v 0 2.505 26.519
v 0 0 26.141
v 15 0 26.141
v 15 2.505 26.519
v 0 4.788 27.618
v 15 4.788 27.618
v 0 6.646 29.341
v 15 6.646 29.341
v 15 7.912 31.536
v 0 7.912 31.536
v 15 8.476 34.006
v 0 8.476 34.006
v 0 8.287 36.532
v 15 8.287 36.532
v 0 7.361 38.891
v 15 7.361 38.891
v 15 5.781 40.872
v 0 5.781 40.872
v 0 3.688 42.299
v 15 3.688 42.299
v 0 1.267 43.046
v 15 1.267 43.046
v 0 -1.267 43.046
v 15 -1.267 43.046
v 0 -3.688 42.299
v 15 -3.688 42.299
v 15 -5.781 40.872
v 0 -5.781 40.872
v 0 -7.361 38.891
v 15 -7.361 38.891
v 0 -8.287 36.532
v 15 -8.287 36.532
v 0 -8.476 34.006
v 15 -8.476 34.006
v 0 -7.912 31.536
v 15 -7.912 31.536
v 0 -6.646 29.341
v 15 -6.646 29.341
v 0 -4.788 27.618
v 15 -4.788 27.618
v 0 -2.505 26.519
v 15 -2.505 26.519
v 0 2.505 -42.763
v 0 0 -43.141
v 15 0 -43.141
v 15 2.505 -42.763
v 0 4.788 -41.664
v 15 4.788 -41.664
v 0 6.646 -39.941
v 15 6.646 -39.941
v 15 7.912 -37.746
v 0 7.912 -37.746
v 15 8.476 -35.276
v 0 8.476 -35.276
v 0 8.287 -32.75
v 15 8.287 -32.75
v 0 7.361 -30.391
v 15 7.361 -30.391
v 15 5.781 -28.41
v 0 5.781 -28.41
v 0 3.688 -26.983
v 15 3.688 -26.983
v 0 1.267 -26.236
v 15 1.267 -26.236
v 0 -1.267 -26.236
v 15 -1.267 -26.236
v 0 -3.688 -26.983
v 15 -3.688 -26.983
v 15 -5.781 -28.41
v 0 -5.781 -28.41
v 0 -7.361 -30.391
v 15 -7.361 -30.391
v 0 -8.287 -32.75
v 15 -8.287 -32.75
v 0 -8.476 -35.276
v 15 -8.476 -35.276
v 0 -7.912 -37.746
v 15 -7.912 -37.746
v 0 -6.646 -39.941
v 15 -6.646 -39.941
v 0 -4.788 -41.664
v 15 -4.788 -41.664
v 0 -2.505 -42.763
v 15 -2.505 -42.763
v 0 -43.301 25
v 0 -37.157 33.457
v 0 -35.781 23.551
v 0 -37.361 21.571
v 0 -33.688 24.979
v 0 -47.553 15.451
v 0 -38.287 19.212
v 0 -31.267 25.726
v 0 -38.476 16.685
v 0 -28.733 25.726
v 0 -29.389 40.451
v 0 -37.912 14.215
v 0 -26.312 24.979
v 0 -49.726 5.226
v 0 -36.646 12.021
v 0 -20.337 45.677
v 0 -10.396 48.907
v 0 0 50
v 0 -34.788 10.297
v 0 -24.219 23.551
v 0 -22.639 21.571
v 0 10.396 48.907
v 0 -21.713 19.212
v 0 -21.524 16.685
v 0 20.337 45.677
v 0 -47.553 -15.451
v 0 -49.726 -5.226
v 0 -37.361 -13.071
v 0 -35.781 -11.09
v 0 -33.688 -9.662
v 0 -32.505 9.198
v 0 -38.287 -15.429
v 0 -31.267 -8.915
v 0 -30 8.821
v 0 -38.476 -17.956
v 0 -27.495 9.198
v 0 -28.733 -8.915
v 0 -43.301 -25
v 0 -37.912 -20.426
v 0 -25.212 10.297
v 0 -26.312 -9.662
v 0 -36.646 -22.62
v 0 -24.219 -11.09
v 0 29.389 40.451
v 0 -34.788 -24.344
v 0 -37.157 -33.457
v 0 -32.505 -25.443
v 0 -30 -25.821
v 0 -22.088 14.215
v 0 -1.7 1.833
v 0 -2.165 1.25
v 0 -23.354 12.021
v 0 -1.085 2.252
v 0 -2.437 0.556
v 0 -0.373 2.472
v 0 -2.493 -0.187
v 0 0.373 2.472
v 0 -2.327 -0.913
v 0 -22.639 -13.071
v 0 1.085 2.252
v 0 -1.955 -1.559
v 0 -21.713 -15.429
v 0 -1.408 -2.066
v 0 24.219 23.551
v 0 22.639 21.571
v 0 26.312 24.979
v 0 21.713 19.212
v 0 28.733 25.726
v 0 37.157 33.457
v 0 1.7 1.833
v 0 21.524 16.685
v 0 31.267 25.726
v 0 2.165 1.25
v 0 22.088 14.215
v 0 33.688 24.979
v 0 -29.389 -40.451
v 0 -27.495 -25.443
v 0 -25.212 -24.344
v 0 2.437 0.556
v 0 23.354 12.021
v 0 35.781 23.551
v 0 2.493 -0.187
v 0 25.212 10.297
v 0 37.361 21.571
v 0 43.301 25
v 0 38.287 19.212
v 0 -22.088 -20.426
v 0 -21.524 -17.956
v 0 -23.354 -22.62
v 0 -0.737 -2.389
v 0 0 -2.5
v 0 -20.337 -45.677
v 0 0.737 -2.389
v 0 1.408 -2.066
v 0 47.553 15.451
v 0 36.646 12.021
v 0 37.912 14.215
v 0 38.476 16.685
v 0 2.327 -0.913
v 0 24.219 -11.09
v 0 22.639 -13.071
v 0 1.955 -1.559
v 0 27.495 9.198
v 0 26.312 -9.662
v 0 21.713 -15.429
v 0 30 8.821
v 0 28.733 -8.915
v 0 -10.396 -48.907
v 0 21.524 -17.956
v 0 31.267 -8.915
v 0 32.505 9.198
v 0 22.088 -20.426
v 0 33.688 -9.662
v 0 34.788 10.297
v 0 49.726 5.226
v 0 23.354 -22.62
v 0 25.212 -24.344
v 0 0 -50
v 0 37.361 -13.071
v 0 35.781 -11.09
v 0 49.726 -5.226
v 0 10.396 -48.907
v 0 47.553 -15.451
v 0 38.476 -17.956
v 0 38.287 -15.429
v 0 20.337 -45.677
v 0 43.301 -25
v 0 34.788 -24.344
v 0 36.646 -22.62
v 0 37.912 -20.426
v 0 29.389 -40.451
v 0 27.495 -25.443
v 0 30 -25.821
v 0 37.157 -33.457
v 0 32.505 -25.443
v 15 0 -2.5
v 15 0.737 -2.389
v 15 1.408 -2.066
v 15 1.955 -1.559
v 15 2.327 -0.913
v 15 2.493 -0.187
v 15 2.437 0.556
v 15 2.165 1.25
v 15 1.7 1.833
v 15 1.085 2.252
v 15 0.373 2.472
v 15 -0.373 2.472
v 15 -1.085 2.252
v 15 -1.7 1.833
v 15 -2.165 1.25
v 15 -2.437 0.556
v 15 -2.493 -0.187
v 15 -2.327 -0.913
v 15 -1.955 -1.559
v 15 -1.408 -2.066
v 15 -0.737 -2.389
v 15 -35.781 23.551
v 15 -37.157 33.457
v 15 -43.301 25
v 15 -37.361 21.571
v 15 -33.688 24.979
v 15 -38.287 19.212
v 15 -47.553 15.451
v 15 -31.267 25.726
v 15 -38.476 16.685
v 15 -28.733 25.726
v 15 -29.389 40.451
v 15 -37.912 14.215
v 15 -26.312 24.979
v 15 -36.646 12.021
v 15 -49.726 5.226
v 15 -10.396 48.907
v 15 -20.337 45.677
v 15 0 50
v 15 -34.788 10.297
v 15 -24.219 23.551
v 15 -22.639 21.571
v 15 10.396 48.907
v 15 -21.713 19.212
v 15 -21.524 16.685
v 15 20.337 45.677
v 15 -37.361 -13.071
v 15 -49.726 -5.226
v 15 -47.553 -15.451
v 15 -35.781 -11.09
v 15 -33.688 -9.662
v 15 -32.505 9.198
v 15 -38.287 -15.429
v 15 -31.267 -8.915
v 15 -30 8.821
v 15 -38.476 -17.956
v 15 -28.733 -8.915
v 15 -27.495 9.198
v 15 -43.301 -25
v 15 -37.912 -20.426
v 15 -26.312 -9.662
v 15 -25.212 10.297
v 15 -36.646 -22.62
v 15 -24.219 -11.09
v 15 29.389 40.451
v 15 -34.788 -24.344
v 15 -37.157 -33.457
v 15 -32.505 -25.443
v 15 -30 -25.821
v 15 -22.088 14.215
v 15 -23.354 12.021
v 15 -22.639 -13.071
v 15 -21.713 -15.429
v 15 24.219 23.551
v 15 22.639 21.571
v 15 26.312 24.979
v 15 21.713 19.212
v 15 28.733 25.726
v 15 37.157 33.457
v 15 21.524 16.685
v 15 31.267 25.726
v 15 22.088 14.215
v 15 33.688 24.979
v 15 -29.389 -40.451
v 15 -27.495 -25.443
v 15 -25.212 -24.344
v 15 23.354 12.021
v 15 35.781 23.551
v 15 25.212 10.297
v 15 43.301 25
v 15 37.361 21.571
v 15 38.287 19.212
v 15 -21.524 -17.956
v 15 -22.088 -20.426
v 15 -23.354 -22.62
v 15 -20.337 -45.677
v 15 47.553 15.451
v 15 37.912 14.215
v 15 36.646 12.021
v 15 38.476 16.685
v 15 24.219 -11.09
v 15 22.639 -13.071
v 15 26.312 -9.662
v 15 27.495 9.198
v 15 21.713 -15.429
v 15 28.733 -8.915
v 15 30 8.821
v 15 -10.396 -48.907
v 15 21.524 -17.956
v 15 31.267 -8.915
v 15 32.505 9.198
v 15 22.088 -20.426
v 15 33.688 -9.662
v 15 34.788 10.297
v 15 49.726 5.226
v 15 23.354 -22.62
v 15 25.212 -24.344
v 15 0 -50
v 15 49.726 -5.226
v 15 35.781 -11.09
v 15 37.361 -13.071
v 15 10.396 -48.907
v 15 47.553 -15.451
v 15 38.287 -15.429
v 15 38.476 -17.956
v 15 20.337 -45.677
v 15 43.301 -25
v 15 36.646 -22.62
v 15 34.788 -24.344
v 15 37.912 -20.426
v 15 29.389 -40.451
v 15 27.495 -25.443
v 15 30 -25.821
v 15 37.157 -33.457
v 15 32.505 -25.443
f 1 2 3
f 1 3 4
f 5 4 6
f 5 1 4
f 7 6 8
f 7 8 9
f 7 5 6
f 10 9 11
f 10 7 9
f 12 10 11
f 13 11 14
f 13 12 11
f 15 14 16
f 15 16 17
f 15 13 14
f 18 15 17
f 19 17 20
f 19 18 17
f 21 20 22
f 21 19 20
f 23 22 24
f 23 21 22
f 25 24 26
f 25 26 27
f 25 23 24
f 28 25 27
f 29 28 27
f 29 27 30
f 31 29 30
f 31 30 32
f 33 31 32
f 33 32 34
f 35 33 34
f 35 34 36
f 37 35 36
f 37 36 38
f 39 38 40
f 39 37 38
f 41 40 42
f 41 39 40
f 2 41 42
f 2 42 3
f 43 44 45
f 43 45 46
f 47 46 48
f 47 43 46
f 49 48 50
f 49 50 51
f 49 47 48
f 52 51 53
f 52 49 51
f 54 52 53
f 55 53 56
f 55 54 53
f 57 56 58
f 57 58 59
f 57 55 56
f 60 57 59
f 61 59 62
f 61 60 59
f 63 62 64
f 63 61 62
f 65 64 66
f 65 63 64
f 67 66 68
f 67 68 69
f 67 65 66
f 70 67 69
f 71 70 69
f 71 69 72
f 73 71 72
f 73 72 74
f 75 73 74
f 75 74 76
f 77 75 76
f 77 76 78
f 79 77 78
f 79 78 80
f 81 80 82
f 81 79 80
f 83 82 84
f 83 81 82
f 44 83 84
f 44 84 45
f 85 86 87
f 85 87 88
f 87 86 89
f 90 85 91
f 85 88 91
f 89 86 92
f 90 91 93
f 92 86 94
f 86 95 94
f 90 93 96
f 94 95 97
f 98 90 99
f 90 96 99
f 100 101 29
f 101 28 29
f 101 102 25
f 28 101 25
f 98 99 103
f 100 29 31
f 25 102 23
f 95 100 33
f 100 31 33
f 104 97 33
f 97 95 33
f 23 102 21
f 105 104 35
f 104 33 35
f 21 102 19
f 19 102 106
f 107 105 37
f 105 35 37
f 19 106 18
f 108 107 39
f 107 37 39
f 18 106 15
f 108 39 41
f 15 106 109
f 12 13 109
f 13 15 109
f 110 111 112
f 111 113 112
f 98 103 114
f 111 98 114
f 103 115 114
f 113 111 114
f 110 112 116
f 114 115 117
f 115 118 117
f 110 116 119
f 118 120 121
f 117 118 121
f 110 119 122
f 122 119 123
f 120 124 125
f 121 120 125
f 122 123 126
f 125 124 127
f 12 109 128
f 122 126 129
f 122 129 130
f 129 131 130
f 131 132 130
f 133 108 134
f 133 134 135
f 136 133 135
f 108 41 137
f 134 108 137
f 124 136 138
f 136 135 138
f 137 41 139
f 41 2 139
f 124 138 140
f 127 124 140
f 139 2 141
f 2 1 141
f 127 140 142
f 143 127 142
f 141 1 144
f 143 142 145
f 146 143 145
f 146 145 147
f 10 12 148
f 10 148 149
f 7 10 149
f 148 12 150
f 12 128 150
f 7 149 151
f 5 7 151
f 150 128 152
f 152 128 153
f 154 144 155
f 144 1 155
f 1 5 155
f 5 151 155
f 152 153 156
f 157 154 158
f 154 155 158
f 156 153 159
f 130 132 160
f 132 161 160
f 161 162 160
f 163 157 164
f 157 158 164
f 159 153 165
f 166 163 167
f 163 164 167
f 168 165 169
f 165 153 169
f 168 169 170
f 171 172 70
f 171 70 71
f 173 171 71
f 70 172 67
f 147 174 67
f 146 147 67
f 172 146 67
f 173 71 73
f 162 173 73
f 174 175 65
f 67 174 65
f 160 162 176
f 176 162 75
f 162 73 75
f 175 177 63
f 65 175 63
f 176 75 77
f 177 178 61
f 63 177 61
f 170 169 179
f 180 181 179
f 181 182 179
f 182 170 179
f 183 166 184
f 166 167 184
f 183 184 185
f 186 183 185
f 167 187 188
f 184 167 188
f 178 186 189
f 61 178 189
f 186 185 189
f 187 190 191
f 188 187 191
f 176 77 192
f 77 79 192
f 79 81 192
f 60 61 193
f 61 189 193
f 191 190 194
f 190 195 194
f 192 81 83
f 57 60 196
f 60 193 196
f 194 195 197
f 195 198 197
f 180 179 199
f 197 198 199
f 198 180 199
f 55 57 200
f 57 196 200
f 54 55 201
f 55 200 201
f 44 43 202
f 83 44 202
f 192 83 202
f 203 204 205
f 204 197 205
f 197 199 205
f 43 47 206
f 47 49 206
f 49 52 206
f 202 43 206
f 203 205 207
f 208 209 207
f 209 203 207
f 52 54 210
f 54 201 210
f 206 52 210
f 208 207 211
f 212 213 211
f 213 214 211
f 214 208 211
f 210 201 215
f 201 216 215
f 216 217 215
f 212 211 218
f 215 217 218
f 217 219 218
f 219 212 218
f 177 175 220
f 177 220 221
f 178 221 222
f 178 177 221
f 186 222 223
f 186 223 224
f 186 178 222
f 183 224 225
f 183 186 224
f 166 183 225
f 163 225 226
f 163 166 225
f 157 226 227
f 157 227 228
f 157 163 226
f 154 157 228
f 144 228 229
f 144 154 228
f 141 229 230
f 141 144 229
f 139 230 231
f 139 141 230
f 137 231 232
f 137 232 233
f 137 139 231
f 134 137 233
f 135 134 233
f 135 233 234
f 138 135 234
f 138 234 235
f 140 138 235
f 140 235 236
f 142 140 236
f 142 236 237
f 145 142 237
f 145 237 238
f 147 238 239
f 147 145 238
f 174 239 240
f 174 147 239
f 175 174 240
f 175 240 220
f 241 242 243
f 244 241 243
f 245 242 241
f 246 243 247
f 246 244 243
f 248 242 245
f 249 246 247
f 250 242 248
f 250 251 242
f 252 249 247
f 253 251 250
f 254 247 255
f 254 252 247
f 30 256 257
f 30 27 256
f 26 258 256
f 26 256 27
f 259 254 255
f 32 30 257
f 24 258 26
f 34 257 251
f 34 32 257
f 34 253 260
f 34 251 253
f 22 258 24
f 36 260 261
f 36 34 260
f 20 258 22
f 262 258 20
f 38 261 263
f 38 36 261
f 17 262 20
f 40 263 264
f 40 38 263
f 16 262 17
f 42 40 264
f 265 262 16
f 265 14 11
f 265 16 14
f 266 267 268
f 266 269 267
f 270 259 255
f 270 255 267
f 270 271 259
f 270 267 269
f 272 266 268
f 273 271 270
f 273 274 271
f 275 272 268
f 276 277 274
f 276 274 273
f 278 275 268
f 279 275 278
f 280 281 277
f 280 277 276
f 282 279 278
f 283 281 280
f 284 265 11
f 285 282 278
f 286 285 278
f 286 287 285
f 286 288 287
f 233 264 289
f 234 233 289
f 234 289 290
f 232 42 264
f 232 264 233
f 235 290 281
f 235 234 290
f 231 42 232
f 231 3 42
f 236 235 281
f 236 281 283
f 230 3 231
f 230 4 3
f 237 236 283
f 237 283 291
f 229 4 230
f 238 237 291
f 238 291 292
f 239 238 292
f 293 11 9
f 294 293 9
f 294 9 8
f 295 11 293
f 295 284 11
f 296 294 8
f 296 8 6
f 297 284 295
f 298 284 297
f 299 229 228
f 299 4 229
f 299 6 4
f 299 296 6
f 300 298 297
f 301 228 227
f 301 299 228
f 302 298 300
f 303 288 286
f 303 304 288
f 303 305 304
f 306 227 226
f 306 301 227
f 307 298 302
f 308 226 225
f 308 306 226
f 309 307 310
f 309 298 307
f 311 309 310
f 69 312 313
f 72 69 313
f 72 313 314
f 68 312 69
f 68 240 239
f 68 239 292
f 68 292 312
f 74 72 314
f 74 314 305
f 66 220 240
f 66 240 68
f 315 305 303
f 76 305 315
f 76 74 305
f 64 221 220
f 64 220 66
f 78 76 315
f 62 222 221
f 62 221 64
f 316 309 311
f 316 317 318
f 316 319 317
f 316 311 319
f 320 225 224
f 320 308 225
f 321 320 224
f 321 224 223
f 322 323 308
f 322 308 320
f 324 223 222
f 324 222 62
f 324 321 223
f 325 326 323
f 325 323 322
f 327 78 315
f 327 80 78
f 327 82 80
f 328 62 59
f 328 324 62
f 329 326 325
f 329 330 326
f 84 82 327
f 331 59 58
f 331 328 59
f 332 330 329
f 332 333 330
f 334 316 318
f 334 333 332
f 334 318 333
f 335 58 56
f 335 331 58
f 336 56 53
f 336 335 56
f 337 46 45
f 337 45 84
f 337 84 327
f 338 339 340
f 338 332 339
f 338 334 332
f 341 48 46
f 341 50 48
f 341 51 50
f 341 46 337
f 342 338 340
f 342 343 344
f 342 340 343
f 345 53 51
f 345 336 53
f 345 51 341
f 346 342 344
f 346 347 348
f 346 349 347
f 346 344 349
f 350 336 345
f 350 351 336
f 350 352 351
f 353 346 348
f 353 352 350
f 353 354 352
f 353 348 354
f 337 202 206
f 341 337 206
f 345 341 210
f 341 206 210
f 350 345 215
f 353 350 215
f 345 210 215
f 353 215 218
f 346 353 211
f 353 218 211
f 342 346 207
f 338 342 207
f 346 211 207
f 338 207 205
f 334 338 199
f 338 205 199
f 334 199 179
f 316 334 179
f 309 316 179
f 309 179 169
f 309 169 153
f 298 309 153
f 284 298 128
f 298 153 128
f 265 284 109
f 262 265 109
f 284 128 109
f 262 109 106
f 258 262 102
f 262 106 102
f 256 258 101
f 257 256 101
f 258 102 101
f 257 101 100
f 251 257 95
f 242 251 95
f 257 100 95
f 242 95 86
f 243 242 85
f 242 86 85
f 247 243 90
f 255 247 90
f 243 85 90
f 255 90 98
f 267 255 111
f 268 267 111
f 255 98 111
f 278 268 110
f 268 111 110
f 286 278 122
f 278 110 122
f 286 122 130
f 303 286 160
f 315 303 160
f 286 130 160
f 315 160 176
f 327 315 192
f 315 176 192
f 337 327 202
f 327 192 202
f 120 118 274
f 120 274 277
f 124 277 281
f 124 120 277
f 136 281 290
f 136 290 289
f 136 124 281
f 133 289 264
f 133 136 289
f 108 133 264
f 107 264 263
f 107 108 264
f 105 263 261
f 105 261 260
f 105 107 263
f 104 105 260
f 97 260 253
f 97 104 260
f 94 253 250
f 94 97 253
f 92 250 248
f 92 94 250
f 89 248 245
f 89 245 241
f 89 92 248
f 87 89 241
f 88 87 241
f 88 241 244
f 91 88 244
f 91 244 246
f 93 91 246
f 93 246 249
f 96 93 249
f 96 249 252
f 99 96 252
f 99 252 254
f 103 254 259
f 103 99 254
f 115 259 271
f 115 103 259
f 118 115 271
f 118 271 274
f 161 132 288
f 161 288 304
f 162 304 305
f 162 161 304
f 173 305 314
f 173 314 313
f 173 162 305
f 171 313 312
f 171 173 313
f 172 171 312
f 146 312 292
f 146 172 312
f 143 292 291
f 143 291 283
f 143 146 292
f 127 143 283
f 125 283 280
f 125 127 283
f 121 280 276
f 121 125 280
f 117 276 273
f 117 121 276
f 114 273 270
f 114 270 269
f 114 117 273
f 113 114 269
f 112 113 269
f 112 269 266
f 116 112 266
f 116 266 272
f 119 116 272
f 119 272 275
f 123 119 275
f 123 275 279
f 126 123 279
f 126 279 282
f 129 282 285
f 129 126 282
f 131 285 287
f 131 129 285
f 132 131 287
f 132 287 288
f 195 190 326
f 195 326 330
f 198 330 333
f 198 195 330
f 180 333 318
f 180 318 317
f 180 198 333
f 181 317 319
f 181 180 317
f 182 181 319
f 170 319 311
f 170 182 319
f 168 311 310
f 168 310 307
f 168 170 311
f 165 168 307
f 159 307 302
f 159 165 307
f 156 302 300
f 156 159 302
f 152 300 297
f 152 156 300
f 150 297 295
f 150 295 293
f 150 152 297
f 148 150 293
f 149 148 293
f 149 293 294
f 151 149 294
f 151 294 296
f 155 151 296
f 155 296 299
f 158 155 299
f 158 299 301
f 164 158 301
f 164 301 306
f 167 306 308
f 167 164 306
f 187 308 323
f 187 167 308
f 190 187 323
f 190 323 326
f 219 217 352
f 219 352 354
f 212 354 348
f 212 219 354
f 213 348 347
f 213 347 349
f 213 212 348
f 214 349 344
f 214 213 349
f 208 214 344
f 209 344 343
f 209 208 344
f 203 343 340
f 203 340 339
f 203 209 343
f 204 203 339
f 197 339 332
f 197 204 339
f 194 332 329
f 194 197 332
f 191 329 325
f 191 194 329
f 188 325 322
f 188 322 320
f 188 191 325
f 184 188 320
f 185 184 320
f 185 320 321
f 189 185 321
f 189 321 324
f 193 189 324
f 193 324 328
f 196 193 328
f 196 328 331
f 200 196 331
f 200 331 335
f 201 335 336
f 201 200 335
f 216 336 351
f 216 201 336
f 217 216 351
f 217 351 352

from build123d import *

# Parameters (mm, degrees)
SKETCH_1_R      = 50
SKETCH_1_R_2    = 8.5
SKETCH_1_R_3    = 2.5
EXTRUDE_1_DEPTH = 15


with BuildPart() as part:
    # 草圖1 → 填料-伸長1 (new body)
    with BuildSketch(Plane(origin=(0, 0, 0), x_dir=(0, 0, -1), z_dir=(1, 0, 0))):
        Circle(SKETCH_1_R)
        with Locations((17.320508076, 30)):
            Circle(SKETCH_1_R_2, mode=Mode.SUBTRACT)
        with Locations((34.641016151, 0)):
            Circle(SKETCH_1_R_2, mode=Mode.SUBTRACT)
        with Locations((17.320508076, -30)):
            Circle(SKETCH_1_R_2, mode=Mode.SUBTRACT)
        with Locations((-17.320508076, -30)):
            Circle(SKETCH_1_R_2, mode=Mode.SUBTRACT)
        with Locations((-34.641016151, 0)):
            Circle(SKETCH_1_R_2, mode=Mode.SUBTRACT)
        with Locations((-17.320508076, 30)):
            Circle(SKETCH_1_R_2, mode=Mode.SUBTRACT)
        Circle(SKETCH_1_R_3, mode=Mode.SUBTRACT)
    extrude(amount=EXTRUDE_1_DEPTH)


solid = part.part
